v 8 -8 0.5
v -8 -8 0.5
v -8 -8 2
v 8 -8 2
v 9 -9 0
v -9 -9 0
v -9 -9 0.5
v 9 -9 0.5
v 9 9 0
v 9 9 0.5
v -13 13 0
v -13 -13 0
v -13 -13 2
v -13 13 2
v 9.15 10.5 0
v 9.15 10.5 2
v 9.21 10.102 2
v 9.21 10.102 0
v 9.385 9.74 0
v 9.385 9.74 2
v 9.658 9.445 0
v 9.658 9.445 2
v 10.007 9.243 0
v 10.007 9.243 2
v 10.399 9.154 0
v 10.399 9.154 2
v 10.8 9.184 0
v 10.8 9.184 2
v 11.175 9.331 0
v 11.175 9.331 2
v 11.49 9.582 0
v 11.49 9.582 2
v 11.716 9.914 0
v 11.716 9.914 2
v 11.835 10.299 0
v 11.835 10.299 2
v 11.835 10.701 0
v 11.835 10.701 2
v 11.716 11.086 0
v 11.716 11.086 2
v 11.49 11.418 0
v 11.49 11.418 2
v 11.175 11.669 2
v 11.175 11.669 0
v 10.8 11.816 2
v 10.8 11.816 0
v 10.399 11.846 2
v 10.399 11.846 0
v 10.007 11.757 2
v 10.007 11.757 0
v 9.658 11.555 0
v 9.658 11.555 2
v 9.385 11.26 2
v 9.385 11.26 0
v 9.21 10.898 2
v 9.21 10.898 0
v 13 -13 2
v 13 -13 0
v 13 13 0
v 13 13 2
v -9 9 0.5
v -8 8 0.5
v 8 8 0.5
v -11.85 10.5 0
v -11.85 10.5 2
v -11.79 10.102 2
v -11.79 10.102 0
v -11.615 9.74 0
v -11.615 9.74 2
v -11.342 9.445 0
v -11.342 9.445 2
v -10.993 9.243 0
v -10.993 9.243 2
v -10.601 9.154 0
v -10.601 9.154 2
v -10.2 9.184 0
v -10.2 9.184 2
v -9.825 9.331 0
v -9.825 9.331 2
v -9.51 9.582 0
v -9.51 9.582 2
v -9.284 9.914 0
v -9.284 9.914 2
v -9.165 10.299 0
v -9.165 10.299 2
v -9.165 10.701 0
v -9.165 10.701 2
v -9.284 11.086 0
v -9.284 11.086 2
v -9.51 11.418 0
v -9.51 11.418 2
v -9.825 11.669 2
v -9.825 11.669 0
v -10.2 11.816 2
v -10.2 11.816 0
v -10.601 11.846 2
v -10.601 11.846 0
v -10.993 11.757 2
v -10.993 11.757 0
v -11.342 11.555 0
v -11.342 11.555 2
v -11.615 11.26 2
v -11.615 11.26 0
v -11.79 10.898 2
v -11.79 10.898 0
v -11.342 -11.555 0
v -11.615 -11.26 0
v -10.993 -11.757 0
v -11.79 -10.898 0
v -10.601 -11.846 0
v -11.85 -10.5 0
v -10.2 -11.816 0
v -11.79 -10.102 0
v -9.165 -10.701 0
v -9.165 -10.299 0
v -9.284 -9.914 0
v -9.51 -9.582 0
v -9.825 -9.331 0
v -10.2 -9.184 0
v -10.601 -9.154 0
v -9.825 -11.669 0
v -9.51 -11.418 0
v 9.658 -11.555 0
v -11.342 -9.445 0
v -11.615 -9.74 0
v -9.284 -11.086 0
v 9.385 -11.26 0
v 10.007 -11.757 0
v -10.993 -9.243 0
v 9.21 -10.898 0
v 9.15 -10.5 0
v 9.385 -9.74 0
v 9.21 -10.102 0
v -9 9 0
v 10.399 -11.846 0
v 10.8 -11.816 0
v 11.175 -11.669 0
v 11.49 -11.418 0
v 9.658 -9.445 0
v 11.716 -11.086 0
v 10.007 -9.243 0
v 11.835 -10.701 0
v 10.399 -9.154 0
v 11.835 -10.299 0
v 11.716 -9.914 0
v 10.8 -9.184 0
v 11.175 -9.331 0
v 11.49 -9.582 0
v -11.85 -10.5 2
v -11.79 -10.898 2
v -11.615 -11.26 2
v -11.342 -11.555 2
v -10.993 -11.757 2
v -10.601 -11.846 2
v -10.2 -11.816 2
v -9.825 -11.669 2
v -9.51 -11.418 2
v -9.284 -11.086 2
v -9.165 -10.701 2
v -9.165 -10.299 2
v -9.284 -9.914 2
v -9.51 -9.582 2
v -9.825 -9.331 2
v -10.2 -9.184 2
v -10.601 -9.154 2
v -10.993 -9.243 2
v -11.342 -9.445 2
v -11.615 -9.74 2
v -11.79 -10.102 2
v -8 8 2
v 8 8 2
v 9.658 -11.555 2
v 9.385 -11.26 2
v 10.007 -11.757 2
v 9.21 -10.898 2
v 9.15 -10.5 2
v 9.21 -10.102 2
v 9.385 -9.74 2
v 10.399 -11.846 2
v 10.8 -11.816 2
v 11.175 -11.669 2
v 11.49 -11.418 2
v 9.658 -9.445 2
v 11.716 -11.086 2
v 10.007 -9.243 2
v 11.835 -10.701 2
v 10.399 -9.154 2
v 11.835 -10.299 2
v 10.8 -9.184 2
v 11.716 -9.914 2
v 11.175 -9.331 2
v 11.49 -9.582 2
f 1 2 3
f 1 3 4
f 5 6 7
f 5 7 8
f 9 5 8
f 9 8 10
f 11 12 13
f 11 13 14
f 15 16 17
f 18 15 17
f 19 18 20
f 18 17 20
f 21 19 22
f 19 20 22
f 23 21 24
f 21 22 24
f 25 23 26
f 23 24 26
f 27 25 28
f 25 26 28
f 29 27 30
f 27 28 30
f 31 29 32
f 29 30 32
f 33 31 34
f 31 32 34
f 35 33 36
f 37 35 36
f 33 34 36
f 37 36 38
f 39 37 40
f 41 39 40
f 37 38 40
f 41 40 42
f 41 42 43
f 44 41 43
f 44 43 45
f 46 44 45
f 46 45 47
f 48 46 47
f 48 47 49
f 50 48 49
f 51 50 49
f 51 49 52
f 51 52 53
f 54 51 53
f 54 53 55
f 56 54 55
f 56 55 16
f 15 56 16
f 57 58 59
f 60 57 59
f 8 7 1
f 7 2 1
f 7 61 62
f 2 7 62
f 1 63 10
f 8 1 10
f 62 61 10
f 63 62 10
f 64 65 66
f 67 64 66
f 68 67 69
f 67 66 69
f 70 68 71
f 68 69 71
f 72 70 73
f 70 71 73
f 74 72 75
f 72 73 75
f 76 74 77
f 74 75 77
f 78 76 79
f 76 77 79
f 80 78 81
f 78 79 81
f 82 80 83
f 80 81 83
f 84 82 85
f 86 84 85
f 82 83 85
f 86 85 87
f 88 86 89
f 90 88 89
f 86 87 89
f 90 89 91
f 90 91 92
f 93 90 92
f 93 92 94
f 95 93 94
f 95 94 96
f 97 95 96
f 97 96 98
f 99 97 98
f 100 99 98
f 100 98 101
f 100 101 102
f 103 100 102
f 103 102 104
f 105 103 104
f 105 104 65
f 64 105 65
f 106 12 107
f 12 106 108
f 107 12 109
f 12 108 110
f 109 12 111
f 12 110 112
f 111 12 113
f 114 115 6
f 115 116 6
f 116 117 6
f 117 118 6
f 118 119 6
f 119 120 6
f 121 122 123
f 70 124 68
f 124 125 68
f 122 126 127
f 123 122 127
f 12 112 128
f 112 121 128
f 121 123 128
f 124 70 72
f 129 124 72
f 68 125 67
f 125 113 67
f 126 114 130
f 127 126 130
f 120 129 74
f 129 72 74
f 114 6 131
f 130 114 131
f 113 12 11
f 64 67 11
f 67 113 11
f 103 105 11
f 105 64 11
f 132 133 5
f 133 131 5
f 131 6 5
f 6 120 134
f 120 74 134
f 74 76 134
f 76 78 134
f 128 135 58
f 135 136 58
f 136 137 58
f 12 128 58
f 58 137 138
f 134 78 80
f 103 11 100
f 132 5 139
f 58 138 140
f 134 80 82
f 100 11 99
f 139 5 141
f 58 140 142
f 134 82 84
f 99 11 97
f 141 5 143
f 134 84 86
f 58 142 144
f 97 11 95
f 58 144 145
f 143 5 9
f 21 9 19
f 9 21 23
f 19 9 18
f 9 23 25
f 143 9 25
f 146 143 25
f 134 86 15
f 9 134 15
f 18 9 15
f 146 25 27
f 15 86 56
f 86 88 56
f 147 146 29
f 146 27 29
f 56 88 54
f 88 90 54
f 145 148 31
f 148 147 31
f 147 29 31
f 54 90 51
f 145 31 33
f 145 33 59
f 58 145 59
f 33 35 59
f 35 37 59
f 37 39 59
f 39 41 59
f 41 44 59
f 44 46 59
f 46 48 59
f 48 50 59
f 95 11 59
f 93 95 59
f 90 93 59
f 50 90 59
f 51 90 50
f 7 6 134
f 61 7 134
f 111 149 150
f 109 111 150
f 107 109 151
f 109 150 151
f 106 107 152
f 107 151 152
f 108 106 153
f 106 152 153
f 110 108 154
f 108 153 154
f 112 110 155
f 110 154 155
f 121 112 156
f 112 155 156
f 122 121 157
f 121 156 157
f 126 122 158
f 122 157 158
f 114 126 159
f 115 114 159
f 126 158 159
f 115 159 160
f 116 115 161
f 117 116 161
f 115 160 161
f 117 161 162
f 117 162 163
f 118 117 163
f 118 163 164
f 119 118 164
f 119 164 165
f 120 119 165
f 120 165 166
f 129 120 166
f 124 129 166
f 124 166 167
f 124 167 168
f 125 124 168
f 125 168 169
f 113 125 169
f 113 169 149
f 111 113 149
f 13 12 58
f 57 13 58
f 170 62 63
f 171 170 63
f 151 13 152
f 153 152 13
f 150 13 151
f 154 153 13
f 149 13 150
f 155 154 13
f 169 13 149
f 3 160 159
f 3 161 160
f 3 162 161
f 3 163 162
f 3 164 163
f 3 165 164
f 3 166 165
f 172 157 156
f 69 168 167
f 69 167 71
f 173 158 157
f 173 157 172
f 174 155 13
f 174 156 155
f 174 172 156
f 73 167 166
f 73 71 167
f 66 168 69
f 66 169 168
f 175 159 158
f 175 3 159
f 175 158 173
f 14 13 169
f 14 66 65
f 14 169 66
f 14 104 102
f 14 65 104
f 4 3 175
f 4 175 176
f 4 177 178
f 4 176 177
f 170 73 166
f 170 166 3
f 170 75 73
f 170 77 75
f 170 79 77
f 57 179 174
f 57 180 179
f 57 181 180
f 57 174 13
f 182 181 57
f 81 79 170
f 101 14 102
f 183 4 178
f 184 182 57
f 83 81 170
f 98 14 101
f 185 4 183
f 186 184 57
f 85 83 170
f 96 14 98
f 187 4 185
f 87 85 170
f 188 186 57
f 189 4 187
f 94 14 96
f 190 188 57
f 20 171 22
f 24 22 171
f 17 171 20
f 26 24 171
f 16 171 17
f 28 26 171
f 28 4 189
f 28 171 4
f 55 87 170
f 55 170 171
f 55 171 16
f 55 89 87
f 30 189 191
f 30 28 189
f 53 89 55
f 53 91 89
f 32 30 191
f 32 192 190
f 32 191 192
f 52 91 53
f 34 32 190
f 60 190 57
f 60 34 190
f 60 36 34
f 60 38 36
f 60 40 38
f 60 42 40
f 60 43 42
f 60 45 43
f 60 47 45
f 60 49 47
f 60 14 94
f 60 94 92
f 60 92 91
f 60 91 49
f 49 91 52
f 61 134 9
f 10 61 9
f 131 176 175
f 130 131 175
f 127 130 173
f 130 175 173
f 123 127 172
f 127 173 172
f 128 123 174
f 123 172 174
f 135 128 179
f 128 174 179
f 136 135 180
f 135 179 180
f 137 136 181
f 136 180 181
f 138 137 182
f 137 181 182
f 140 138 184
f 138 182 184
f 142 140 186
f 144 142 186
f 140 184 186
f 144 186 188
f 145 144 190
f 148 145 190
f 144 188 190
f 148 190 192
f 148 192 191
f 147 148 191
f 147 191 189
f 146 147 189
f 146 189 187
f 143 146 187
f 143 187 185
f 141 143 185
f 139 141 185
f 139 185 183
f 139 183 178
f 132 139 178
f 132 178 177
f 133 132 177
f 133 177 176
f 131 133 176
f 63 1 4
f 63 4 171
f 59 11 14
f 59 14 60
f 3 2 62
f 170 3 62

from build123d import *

# Parameters (mm, degrees)
F0_W     = 26
F0_H     = 26
F0_W_2   = 18
F0_H_2   = 18
F0_W_3   = 16
F0_H_3   = 16
F1_DEPTH = 2
F2_DEPTH = 0.5
F4_D     = 2.7
F4_DEPTH = 3.5
F4_TIP   = 0.8111618357


with BuildPart() as f1:
    # F0 (on Top) → F1 (new body)
    with BuildSketch(Plane.XY):
        Rectangle(F0_W, F0_H)
        Rectangle(F0_W_2, F0_H_2, mode=Mode.SUBTRACT)
        Rectangle(F0_W_2, F0_H_2)
        Rectangle(F0_W_3, F0_H_3, mode=Mode.SUBTRACT)
    extrude(amount=F1_DEPTH)

    # F0 (on Top) → F2 (cut)
    with BuildSketch(Plane.XY):
        Rectangle(F0_W_2, F0_H_2)
        Rectangle(F0_W_3, F0_H_3, mode=Mode.SUBTRACT)
    extrude(amount=F2_DEPTH, mode=Mode.SUBTRACT)

    # F4
    with Locations(Plane(origin=(0, 0, 0), x_dir=(1, 0, 0), z_dir=(0, 0, -1))):
        with Locations((-10.5, 10.5), (10.5, 10.5), (10.5, -10.5), (-10.5, -10.5)):
            Hole(F4_D / 2, depth=F4_DEPTH)
            with Locations((0, 0, -(F4_DEPTH + F4_TIP / 2))):  # 118° drill point
                Cone(0, F4_D / 2, F4_TIP, mode=Mode.SUBTRACT)


solid = f1.part
